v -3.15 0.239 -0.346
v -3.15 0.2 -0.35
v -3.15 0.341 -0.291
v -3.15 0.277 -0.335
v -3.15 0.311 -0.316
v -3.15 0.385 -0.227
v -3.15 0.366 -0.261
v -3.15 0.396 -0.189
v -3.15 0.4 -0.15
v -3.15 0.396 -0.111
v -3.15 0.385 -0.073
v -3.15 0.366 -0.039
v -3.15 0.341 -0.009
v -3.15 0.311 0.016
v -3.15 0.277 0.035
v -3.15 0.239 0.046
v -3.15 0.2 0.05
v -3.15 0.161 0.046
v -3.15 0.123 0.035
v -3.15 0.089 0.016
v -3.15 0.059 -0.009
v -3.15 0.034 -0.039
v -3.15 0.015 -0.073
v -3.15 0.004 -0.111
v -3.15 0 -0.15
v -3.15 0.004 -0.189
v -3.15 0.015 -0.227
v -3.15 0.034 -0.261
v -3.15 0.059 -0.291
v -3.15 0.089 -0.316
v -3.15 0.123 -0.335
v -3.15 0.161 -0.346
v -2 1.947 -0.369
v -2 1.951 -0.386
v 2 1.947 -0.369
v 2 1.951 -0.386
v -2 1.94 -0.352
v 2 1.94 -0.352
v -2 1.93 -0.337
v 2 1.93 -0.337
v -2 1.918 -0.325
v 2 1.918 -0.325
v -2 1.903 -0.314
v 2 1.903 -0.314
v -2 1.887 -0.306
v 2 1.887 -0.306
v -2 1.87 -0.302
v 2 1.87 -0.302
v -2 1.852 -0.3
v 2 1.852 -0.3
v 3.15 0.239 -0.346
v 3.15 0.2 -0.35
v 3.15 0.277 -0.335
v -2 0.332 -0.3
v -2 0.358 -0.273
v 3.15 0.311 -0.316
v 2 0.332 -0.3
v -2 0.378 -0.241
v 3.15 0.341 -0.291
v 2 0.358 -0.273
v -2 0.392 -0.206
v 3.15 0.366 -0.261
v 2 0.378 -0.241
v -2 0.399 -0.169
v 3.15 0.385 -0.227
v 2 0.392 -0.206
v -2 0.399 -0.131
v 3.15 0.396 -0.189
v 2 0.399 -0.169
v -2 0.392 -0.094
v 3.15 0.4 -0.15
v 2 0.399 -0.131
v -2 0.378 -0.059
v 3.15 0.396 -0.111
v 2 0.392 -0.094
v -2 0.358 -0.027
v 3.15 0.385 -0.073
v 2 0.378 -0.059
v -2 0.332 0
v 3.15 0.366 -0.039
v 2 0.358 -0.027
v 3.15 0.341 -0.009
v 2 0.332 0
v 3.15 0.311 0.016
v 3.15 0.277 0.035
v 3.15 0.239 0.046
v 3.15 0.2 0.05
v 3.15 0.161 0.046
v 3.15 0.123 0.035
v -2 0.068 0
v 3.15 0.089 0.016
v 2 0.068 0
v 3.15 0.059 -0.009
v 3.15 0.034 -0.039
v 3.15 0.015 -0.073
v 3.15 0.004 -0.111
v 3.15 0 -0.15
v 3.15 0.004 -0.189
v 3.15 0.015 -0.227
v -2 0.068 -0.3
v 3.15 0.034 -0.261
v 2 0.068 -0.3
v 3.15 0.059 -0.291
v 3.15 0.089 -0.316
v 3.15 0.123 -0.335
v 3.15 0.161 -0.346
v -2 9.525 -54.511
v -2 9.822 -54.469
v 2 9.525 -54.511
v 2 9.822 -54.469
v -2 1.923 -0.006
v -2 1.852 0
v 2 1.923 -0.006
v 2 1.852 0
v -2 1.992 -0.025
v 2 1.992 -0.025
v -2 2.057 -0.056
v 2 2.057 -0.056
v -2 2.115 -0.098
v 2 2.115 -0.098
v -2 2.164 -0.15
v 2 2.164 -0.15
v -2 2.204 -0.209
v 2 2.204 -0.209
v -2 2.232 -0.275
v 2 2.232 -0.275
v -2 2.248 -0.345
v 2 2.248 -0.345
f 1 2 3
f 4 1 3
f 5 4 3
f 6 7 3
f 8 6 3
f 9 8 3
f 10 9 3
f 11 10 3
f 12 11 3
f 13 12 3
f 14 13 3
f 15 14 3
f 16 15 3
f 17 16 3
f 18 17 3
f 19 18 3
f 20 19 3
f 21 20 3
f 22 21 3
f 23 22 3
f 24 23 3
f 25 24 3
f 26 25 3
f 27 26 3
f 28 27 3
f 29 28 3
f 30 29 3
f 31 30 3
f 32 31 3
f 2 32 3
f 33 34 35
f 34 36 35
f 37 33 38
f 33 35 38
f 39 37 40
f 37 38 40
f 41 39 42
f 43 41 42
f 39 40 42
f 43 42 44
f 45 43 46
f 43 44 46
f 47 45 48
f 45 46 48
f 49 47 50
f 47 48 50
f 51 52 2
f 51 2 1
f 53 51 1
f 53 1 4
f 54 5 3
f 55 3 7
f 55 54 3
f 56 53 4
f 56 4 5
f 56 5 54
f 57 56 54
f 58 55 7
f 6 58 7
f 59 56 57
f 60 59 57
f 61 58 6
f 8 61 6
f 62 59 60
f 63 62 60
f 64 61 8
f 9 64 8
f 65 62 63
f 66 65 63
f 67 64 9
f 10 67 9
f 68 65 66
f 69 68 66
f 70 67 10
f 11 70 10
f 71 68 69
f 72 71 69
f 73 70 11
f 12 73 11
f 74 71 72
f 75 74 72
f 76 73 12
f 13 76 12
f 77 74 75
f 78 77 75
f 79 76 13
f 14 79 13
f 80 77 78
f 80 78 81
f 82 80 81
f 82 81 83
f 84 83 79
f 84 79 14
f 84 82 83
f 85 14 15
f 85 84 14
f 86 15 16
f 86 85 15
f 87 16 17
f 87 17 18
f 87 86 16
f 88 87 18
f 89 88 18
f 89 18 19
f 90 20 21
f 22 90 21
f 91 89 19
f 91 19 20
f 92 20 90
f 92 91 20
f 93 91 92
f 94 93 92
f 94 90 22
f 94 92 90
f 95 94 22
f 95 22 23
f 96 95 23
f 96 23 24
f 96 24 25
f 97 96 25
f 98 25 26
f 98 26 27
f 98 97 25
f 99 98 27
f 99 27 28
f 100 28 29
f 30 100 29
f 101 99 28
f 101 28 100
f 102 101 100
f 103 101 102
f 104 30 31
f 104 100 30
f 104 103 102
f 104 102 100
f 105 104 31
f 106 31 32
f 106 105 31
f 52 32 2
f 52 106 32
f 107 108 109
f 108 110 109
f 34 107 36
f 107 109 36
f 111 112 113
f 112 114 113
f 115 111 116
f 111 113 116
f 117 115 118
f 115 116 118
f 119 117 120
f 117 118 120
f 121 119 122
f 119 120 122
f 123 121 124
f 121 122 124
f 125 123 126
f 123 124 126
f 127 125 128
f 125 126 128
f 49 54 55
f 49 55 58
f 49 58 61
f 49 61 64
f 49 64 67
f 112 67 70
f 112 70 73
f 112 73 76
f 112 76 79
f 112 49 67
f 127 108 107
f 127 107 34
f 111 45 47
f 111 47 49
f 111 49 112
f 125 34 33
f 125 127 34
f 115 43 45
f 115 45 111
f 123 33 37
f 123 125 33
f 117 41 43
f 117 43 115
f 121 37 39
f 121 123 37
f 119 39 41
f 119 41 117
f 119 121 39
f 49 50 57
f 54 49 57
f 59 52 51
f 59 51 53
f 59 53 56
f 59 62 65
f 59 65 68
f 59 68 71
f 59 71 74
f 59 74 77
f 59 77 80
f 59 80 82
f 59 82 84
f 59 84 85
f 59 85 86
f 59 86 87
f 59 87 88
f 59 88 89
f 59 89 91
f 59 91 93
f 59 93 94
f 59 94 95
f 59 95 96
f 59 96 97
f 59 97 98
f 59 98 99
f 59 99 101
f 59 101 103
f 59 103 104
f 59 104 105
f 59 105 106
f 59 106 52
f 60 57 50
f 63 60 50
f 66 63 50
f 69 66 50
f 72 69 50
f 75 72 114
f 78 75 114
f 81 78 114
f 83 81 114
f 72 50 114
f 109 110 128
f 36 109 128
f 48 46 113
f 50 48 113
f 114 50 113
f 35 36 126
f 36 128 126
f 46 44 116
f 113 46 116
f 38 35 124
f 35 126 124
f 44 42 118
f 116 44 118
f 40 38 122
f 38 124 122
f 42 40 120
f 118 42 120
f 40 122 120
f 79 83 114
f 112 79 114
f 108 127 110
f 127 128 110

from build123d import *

# Parameters (mm, degrees)
BASE_FLANGE1_DEPTH     = 2
CUT_EXTRUDE1_START     = -2
CUT_EXTRUDE1_OUTLINE_W = 0.3
CUT_EXTRUDE1_OUTLINE_H = 0.067712434
CUT_EXTRUDE1_DEPTH     = 4
SKETCH8_R              = 0.2
BOSS_EXTRUDE1_DEPTH    = 3.15


# Read off the part's stored shape, not the designer's step: Cut-Extrude1
# Sheet-metal steps are written as plain solids
with BuildPart() as part:
    # Sketch1 → Base-Flange1 (new, symmetric)
    with BuildSketch(Plane(origin=(0, 0, 0), x_dir=(0, 0, -1), z_dir=(1, 0, 0))):
        with BuildLine():
            Line((0, 0), (0, 1.852075023))
            ThreePointArc((0, 1.852075023), (0.09819474, 2.114588994), (0.344567924, 2.24821551))
            Line((0.344567924, 2.24821551), (54.469316873, 9.82191048))
            Line((54.469316873, 9.82191048), (54.51089093, 9.524805115))
            Line((54.51089093, 9.524805115), (0.386141981, 1.951110145))
            ThreePointArc((0.386141981, 1.951110145), (0.324548685, 1.917703516), (0.3, 1.852075023))
            Line((0.3, 1.852075023), (0.3, 0))
            Line((0.3, 0), (0, 0))
        make_face()
    extrude(amount=BASE_FLANGE1_DEPTH, both=True)

    # Cut-Extrude1 outline → Cut-Extrude1 (cut)
    with BuildSketch(Plane(origin=(0, 0, 0), x_dir=(0, 0, -1), z_dir=(1, 0, 0)).offset(CUT_EXTRUDE1_START)):
        with Locations((0.15, 0.033856217)):
            Rectangle(CUT_EXTRUDE1_OUTLINE_W, CUT_EXTRUDE1_OUTLINE_H)
    extrude(amount=CUT_EXTRUDE1_DEPTH, mode=Mode.SUBTRACT)

    # Sketch8 → Boss-Extrude1 (add, symmetric)
    with BuildSketch(Plane(origin=(0, 0, 0), x_dir=(0, 0, -1), z_dir=(1, 0, 0))):
        with Locations((0.15, 0.2)):
            Circle(SKETCH8_R)
    extrude(amount=BOSS_EXTRUDE1_DEPTH, both=True)


solid = part.part
